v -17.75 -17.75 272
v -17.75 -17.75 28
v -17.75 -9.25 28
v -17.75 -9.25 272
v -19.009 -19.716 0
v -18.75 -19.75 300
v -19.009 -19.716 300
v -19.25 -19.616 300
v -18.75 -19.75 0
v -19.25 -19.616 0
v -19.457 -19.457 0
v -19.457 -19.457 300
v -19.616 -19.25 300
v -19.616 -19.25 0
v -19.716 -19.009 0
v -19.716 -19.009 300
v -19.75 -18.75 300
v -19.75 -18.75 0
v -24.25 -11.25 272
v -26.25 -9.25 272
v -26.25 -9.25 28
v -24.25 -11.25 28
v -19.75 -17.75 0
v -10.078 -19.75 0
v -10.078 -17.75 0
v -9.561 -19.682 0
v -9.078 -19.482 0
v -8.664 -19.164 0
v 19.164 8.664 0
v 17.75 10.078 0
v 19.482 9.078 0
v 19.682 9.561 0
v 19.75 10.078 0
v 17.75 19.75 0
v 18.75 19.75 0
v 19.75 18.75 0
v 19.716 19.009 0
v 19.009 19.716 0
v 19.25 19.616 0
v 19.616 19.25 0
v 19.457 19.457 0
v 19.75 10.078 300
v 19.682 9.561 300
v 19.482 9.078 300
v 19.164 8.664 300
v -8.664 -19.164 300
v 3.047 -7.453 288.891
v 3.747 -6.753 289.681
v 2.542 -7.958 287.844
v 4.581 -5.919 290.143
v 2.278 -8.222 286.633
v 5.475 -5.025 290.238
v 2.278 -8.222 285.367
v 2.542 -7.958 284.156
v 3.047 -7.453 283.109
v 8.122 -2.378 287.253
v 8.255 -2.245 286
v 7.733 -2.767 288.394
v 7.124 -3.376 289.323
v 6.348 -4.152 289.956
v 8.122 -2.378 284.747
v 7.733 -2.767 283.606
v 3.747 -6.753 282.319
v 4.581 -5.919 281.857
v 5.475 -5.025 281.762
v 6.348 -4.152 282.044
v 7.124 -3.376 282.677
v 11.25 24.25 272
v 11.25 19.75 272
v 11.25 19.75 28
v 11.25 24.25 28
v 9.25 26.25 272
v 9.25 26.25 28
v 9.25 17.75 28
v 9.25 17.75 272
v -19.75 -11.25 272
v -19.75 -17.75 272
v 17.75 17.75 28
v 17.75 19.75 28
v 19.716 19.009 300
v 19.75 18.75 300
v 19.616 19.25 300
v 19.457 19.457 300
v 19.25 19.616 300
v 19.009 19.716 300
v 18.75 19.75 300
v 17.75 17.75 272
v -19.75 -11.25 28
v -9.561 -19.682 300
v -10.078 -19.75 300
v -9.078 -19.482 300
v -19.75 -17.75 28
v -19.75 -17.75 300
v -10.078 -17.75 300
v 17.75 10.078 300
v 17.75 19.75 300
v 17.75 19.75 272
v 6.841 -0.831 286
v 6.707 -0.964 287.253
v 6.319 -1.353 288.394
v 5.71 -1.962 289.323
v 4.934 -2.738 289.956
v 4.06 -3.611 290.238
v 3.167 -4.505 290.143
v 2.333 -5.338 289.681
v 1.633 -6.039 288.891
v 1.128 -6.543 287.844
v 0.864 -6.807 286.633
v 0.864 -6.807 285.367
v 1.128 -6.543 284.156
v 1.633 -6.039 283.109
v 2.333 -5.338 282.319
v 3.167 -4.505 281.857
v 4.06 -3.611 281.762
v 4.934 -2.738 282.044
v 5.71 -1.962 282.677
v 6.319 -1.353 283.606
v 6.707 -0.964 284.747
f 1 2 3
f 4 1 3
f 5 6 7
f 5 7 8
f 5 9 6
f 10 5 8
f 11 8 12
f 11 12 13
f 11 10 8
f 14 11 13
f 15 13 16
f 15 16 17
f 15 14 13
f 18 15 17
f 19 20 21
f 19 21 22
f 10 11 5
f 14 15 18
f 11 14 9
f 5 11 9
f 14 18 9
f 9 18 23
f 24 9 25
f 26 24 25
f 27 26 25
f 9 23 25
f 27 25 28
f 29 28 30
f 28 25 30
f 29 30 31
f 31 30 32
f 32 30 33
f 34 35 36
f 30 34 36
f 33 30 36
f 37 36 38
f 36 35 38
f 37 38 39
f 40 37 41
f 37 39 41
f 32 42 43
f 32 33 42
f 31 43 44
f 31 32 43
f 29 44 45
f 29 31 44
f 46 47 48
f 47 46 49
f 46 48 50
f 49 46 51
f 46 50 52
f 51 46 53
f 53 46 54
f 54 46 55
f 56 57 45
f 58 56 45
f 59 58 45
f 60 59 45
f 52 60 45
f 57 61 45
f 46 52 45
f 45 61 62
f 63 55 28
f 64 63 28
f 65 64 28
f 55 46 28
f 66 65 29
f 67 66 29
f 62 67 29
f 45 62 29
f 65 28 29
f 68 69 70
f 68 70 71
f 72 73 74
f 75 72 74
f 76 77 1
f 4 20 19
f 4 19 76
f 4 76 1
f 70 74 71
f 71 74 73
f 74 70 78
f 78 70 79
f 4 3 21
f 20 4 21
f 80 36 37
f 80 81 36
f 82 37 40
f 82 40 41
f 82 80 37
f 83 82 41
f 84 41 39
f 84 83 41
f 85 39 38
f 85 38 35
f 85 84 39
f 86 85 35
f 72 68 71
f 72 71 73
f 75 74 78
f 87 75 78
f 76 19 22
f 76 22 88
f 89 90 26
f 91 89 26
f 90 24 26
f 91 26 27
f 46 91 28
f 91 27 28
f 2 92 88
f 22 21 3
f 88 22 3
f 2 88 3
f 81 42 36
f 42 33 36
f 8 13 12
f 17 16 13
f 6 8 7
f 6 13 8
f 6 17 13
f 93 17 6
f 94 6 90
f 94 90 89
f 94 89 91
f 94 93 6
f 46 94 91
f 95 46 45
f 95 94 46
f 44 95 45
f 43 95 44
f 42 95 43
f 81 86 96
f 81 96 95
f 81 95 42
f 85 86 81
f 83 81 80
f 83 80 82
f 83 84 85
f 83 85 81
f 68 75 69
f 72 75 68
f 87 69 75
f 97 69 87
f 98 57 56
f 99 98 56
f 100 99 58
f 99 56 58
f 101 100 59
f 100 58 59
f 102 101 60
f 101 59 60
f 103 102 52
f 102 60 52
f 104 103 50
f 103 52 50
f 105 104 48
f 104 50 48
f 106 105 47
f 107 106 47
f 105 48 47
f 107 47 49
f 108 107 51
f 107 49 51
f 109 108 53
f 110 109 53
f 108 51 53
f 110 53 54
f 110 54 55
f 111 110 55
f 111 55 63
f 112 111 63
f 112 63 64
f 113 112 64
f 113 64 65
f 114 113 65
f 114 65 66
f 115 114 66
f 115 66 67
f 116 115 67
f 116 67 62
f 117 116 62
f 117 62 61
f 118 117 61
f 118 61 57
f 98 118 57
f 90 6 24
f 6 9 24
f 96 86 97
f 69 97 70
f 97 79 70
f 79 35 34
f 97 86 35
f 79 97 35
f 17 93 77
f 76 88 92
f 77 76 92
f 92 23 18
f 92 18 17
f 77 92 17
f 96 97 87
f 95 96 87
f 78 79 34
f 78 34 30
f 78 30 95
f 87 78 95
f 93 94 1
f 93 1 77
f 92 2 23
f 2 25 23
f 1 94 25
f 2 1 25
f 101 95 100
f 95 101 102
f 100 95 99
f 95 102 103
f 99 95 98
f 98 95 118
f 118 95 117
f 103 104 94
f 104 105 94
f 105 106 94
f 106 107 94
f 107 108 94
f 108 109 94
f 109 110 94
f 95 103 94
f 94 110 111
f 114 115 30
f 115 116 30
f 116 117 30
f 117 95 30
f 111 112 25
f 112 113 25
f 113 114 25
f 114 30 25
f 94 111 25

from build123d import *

# Parameters (mm, degrees)
F1_DEPTH = 28
F3_DEPTH = 244
F5_DEPTH = 28
F6_R     = 2
F7_R     = 1
F8_R     = 4.25
F9_DEPTH = 25


with BuildPart() as f1:
    # F0 (on Top) → F1 (new body)
    with BuildSketch(Plane.XY):
        Polygon((-19.75, -17.750001), (-19.75, -19.75), (-9.25, -19.75), (19.75, 9.25), (19.75, 19.75), (17.750001, 19.75), (17.750001, 10.078427), (-10.078427, -17.750001), align=None)
    extrude(amount=F1_DEPTH)

    # F2 (on face) → F3 (join)
    with BuildSketch(Plane.XY.offset(28)):
        Polygon((-19.75, -19.75), (-9.25, -19.75), (19.75, 9.25), (19.75, 19.75), (11.25, 19.75), (11.25, 24.25), (9.25, 26.25), (9.25, 23.421573), (9.25, 19.75), (9.25, 17.750001), (17.750001, 17.750001), (17.750001, 10.078427), (16.585787, 8.914213), (-8.914213, -16.585787), (-10.078427, -17.750001), (-17.750001, -17.750001), (-17.750001, -9.25), (-19.75, -9.25), (-23.421573, -9.25), (-26.25, -9.25), (-24.25, -11.25), (-19.75, -11.25), align=None)
    extrude(amount=F3_DEPTH)

    # F4 (on face) → F5 (join)
    with BuildSketch(Plane.XY.offset(272)):
        Polygon((19.75, 9.25), (19.75, 19.75), (17.750001, 19.75), (17.750001, 10.078427), (-10.078427, -17.750001), (-19.75, -17.750001), (-19.75, -19.75), (-9.25, -19.75), align=None)
    extrude(amount=F5_DEPTH)

    # F6
    f6_edges = [f1.edges().sort_by_distance(p)[0] for p in [
        (19.75, 9.25, 150),
        (-9.25, -19.75, 150),
    ]]
    fillet(f6_edges, radius=F6_R)

    # F7
    f7_edges = [f1.edges().sort_by_distance(p)[0] for p in [
        (-19.75, -19.75, 150),
        (19.75, 19.75, 150),
    ]]
    fillet(f7_edges, radius=F7_R)

    # F8 (on face) → F9 (cut)
    with BuildSketch(Plane(origin=(5.25, -5.25, 0), x_dir=(0.707107, 0.707107, 0), z_dir=(0.707107, -0.707107, 0))):
        with Locations((0, 286)):
            Circle(F8_R)
    extrude(amount=-F9_DEPTH, mode=Mode.SUBTRACT)


solid = f1.part
